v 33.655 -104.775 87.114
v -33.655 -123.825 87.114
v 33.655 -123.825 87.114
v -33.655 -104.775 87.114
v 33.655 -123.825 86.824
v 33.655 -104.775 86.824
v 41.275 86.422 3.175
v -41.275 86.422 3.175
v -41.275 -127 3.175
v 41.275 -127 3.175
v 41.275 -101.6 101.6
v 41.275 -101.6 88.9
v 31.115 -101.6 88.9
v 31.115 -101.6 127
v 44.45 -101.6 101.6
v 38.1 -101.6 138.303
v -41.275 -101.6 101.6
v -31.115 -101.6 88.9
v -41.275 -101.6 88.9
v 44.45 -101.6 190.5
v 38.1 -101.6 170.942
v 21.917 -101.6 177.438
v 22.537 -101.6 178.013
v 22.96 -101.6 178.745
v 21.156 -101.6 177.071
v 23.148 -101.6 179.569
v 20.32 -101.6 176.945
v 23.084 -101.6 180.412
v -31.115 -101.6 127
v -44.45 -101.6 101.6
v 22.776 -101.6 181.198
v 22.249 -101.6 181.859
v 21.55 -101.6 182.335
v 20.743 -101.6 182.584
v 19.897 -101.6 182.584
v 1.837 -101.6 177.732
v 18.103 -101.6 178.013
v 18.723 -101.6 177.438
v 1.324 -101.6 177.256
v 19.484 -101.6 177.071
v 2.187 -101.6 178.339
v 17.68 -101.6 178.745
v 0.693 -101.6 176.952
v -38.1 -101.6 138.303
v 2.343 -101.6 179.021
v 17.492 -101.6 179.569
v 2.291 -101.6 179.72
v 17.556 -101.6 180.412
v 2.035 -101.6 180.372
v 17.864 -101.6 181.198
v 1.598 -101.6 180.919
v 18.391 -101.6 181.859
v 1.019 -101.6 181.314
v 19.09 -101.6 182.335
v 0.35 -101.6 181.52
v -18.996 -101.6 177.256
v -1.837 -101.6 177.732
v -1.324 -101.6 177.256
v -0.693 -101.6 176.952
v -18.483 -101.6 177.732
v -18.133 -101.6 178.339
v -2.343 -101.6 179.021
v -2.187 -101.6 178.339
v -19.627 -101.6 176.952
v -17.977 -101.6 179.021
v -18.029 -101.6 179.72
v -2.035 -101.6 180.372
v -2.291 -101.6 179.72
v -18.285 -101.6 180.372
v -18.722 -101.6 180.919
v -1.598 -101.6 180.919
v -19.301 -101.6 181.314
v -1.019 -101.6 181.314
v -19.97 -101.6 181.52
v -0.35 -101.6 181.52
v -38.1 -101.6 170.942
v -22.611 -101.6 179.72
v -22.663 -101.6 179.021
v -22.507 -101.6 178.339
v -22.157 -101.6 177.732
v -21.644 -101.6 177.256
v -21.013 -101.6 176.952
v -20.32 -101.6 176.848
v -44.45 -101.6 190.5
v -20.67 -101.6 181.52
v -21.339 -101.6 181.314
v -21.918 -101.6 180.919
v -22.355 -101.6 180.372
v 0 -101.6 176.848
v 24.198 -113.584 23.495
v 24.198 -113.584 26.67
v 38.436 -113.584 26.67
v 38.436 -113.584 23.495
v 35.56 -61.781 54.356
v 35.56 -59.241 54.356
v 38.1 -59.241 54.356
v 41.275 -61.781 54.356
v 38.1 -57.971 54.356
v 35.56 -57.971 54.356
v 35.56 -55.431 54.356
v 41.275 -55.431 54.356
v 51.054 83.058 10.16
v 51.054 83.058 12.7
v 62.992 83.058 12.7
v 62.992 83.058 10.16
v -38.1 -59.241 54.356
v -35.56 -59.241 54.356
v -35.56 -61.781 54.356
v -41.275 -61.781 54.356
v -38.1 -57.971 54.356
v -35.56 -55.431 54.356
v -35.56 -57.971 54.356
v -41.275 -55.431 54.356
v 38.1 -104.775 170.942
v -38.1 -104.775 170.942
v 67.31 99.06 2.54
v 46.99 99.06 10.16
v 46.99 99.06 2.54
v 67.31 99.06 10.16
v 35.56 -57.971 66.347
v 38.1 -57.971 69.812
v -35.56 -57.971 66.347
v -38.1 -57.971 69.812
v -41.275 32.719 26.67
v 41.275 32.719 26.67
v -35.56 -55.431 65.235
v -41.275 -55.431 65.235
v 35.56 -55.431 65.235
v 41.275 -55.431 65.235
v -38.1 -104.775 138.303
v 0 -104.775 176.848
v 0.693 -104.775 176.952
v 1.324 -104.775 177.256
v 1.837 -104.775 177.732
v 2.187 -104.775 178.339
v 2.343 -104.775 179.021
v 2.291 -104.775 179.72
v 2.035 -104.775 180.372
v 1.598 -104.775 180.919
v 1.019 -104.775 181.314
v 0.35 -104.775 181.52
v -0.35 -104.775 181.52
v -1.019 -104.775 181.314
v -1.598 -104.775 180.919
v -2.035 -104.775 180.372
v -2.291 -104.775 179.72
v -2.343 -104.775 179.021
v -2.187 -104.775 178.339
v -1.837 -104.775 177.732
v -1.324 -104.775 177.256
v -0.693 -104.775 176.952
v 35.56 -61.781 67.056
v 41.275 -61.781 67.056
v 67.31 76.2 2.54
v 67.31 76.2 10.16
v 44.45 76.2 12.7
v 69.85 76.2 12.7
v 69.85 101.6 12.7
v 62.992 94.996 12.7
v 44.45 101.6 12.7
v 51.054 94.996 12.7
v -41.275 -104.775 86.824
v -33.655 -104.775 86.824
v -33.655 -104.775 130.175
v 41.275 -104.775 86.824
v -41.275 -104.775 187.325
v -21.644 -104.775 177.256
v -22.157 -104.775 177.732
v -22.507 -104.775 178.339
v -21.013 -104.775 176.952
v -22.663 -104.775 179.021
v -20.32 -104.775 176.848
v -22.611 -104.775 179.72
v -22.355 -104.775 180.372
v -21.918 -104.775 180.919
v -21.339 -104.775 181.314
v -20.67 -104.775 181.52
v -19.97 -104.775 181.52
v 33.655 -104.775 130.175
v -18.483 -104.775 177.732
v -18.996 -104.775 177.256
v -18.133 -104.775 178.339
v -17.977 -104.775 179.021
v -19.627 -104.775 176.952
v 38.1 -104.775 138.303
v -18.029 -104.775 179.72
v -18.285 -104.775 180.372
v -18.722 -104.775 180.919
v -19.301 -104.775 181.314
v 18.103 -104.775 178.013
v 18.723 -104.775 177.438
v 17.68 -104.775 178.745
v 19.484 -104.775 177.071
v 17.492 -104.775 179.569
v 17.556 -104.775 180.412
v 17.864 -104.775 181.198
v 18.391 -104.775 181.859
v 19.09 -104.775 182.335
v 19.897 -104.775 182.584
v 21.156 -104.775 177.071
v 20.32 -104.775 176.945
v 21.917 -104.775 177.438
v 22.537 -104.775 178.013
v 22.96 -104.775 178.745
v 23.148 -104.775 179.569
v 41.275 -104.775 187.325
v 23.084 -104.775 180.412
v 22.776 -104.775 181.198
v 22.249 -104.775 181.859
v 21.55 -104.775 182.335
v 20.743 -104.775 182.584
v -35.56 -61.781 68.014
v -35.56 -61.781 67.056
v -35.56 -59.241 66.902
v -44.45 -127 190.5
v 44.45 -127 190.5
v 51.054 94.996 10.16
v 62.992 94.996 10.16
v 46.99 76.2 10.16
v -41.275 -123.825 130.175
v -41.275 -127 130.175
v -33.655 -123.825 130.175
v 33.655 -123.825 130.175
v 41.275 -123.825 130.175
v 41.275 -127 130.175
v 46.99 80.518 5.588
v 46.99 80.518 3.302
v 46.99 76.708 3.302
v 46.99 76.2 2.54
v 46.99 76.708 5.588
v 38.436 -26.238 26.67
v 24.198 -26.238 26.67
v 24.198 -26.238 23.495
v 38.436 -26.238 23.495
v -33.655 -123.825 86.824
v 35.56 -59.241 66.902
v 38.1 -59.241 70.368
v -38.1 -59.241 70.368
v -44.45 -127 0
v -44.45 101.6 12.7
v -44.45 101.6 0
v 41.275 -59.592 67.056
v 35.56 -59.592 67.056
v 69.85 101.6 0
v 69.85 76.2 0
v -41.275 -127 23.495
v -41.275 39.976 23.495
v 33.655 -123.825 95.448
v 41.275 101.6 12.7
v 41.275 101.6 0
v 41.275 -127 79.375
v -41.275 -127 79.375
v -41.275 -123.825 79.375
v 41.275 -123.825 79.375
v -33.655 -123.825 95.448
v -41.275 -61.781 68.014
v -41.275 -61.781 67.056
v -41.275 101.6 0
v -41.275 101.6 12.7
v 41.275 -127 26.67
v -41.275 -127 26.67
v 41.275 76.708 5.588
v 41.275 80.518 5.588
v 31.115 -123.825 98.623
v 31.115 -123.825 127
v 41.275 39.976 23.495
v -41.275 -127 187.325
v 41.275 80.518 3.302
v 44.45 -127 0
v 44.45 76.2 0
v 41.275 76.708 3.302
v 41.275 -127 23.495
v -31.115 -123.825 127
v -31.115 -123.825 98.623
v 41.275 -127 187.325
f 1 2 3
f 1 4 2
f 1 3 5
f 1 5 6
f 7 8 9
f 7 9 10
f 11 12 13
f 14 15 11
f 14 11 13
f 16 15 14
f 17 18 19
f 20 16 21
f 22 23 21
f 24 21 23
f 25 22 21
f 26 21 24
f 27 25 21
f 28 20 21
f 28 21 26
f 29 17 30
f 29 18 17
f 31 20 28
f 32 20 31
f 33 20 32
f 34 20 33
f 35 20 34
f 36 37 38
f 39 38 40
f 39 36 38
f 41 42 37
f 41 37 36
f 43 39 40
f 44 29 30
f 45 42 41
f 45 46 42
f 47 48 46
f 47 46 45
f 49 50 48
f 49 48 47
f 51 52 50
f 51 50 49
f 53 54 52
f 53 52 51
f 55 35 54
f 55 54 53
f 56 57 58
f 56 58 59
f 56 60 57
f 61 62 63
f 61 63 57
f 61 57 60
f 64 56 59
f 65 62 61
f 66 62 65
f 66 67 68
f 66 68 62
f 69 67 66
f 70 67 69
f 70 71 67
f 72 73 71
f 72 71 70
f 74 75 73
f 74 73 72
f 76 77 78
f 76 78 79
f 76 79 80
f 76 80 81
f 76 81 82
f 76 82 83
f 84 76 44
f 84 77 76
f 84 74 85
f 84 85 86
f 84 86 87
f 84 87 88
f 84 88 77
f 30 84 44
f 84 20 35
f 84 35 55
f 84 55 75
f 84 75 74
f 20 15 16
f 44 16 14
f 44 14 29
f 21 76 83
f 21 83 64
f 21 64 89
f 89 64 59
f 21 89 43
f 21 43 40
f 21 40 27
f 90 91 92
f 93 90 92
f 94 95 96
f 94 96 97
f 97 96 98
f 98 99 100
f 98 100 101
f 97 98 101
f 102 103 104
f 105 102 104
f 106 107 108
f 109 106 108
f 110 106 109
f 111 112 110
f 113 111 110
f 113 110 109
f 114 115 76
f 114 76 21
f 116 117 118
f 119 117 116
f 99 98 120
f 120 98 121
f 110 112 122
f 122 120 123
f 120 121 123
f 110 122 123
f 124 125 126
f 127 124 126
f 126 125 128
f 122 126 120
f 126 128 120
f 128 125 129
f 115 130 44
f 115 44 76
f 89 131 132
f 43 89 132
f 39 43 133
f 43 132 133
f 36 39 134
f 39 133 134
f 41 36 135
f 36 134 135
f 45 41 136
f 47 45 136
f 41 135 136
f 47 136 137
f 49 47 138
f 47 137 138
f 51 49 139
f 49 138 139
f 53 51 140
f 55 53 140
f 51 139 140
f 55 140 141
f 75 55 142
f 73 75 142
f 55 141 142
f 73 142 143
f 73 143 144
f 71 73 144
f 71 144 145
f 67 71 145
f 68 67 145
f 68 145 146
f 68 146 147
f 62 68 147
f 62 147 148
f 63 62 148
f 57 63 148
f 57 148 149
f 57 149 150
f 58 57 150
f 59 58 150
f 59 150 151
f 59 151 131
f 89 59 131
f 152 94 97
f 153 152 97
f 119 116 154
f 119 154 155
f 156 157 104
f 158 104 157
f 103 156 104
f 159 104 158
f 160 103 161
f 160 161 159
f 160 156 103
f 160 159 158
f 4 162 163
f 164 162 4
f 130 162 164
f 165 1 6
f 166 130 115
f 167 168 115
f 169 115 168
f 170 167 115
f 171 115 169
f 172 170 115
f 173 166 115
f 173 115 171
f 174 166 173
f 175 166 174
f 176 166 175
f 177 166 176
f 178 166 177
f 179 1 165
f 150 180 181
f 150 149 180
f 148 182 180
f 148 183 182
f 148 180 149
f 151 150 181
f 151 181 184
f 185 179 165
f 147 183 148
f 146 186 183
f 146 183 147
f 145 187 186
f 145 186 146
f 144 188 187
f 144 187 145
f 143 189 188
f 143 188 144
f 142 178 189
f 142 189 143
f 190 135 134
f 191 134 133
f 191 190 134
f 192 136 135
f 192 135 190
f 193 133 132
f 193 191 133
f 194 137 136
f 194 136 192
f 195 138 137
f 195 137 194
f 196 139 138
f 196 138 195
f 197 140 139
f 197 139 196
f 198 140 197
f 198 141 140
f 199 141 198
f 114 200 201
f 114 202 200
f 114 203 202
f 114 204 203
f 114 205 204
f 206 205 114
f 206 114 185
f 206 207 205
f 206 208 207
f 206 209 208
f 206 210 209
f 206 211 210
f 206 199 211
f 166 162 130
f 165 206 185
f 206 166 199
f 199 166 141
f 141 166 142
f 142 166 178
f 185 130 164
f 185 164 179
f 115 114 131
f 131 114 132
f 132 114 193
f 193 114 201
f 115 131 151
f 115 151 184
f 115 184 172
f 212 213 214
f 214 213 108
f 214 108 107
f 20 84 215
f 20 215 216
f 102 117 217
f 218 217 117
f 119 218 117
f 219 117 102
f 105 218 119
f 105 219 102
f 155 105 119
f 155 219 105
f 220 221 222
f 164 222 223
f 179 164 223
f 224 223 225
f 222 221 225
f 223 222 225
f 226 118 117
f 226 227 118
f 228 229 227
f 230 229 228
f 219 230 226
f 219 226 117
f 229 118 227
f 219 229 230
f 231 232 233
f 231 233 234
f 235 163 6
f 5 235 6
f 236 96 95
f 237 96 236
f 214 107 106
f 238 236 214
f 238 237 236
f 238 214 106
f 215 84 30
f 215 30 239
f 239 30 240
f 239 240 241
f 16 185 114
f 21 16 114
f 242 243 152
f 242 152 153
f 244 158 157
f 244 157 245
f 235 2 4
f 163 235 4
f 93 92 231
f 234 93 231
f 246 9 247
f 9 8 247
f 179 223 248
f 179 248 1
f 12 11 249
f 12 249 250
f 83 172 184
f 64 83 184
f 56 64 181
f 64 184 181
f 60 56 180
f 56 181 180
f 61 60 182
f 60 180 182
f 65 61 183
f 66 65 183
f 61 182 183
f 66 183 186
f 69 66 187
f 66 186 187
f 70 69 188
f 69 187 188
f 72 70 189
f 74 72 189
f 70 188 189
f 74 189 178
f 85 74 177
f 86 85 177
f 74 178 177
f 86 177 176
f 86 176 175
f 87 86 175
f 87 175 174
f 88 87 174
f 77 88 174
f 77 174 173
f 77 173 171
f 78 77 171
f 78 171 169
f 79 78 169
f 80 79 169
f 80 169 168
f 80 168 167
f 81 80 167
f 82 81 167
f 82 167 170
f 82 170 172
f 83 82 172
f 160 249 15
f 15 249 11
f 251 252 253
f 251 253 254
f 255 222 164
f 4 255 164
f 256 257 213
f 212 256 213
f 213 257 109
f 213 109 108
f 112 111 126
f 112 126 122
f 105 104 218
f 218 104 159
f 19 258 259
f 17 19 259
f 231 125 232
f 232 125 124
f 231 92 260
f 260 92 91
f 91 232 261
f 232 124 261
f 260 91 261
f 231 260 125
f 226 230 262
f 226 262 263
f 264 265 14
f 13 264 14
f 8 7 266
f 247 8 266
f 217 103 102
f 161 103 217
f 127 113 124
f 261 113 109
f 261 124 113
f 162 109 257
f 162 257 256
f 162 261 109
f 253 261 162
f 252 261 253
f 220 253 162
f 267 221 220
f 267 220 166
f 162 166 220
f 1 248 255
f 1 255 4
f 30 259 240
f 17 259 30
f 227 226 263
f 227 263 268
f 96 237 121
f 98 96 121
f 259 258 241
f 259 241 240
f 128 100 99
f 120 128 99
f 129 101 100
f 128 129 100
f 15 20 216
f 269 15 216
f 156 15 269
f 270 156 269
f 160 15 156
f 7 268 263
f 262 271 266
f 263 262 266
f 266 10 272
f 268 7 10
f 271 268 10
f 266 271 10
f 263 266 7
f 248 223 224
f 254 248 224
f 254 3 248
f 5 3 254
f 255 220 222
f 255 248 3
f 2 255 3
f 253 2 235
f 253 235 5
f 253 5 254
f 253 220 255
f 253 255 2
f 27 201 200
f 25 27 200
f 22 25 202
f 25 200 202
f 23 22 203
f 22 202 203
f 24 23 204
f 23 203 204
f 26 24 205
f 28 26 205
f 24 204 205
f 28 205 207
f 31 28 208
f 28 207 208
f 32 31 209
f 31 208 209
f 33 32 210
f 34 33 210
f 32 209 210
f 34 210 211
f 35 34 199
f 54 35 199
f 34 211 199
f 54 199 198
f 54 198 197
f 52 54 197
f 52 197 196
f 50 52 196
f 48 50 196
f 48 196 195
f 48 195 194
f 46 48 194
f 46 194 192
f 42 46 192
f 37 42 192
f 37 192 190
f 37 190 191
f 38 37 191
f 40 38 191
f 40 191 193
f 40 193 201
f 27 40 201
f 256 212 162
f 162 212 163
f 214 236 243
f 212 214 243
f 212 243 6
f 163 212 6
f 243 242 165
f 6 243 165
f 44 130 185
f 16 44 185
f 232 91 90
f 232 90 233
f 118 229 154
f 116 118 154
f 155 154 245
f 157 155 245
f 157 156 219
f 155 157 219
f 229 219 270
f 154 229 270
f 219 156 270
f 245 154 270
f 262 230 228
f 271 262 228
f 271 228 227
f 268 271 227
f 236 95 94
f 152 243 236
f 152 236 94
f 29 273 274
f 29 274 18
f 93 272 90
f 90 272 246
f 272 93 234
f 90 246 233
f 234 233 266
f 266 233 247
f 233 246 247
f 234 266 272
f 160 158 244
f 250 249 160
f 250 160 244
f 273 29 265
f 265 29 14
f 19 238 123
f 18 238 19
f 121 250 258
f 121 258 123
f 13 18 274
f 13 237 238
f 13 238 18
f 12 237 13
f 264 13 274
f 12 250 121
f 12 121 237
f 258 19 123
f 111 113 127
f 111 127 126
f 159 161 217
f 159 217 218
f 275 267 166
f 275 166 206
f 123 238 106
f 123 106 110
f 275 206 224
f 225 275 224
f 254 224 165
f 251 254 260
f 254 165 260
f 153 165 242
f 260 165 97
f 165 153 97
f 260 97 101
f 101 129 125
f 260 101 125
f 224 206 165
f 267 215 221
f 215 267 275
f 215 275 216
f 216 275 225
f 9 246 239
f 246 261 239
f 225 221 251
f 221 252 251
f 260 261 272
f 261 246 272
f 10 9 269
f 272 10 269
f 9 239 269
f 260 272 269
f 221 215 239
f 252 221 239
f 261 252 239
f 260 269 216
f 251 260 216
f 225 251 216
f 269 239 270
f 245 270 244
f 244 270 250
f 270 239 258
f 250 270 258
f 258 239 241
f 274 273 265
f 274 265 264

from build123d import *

# Parameters (mm, degrees)
SKETCH3_W                       = 88.9
SKETCH3_H                       = 203.2
BOSS_EXTRUDE2_DEPTH             = 88.9
CUT_EXTRUDE1_DEPTH              = 101.6
SHELL2_T                        = -3.175
SKETCH5_W                       = 88.9
SKETCH5_H                       = 25.4
BOSS_EXTRUDE3_DEPTH             = 190.5
SHELL4_START                    = -41.275
SHELL4_DEPTH                    = 82.55
CUT_EXTRUDE2_REACH              = 284.057
SKETCH7_W                       = 82.55
SKETCH7_H                       = 38.1
BOSS_EXTRUDE4_REACH             = 246.475
BOSS_EXTRUDE5_REACH             = 284.057
SKETCH10_W                      = 88.9
SKETCH10_H                      = 3.175
CUT_EXTRUDE7_REACH              = 302.872
SKETCH13_W                      = 82.55
SKETCH13_H                      = 57.15
BOSS_EXTRUDE6_START             = -3.175
BOSS_EXTRUDE6_DEPTH             = 3.175
BOSS_EXTRUDE7_REACH             = 284.057
SKETCH16_W                      = 82.55
SKETCH16_H                      = 3.175
CUT_EXTRUDE8_REACH              = 302.872
SKETCH17_W                      = 82.55
SKETCH17_H                      = 76.2
BOSS_EXTRUDE8_REACH             = 286.353
SKETCH18_W                      = 82.548541704
SKETCH18_H                      = 0.29056195
BOSS_EXTRUDE9_REACH             = 246.475
CUT_EXTRUDE9_REACH              = 173.426
SKETCH23_W                      = 76.2
SKETCH23_H                      = 1.27
BOSS_EXTRUDE10_DEPTH            = 12.7
BOSS_EXTRUDE11_REACH            = 184.601
SKETCH25_W                      = 5.715
SKETCH25_H                      = 2.188780981
SKETCH26_W                      = 12.7
SKETCH26_H                      = 25.4
BOSS_EXTRUDE12_DEPTH            = 25.4
SKETCH27_W                      = 20.32
SKETCH27_H                      = 7.62
CUT_EXTRUDE10_DEPTH             = 22.86
SKETCH29_W                      = 2.286
SKETCH29_H                      = 3.81
CUT_EXTRUDE12_DEPTH             = 19.304
CUT_EXTRUDE13_REACH             = 231.392
SKETCH30_W                      = 11.938
SKETCH30_H                      = 11.938
CUT_EXTRUDE14_REACH             = 220.743
SKETCH31_W                      = 14.238530822
SKETCH31_H                      = 87.346215886
CUT_EXTRUDE16_REACH             = 194.71
SKETCH32_W                      = 7.62
SKETCH32_H                      = 19.05
CUT_EXTRUDE16_DIRECTION_2_DEPTH = 56.896
BOSS_EXTRUDE13_REACH            = 194.71
CUT_EXTRUDE17_REACH             = 291.413
SKETCH34_W                      = 76.2
SKETCH34_H                      = 32.639
CUT_EXTRUDE18_REACH             = 291.413
SKETCH35_R                      = 2.3495
SKETCH35_R_2                    = 2.83553705


# Read off the part's stored shape, not the designer's step: Shell4
with BuildPart() as part:
    # Sketch3 → Boss-Extrude2 (new body)
    with BuildSketch(Plane.XY):
        Rectangle(SKETCH3_W, SKETCH3_H)
    extrude(amount=BOSS_EXTRUDE2_DEPTH)

    # Sketch4 → Cut-Extrude1 (cut)
    with BuildSketch(Plane(origin=(44.45, 0, 0), x_dir=(0, 0, -1), z_dir=(1, 0, 0))):
        Polygon((0, 101.6), (-88.9, -101.6), (-88.9, 101.6), align=None)
    extrude(amount=-CUT_EXTRUDE1_DEPTH, mode=Mode.SUBTRACT)

    # Shell2
    shell2_openings = [part.faces().sort_by_distance(p)[0] for p in [
        (0, 0, 0),
        (0, -101.6, 44.45),
    ]]
    offset(amount=SHELL2_T, openings=shell2_openings, kind=Kind.INTERSECTION)

    # Sketch5 → Boss-Extrude3 (add)
    with BuildSketch(Plane.XY):
        with Locations((0, -114.3)):
            Rectangle(SKETCH5_W, SKETCH5_H)
    extrude(amount=BOSS_EXTRUDE3_DEPTH)

    # Shell4 outline → Shell4 (cut)
    with BuildSketch(Plane.YZ.offset(SHELL4_START)):
        Polygon((-123.825, 3.175), (-101.6, 3.175), (-101.6, 85.43443805), (-104.775, 86.82350055), (-104.775, 187.325), (-123.825, 187.325), align=None)
    extrude(amount=SHELL4_DEPTH, mode=Mode.SUBTRACT)

    # Sketch7 → Cut-Extrude2 (cut, up to next)
    with BuildSketch(Plane(origin=(0, -101.6, 0), x_dir=(1, 0, 0), z_dir=(0, 1, 0)), mode=Mode.PRIVATE) as cut_extrude2_sk1:
        with Locations((0, -107.95)):
            Rectangle(SKETCH7_W, SKETCH7_H)
    cut_extrude2_tool1 = extrude(cut_extrude2_sk1.sketch, amount=-CUT_EXTRUDE2_REACH, mode=Mode.PRIVATE) & part.part
    add(cut_extrude2_tool1.solids().sort_by_distance((0, -101.6, 107.95))[0], mode=Mode.SUBTRACT)

    # Sketch9 → Boss-Extrude4 (add, up to next)
    with BuildSketch(Plane.ZY.offset(-41.275), mode=Mode.PRIVATE) as boss_extrude4_sk1:
        Polygon((88.9, -101.6), (98.6234375, -123.825), (95.4484375, -123.825), (85.725, -101.6), align=None)
    boss_extrude4_tool1 = extrude(boss_extrude4_sk1.sketch, amount=BOSS_EXTRUDE4_REACH, mode=Mode.PRIVATE) - part.part
    add(boss_extrude4_tool1.solids().sort_by_distance((41.275, -112.7125, 92.174219))[0])

    # Sketch10 → Boss-Extrude5 (add, up to next)
    with BuildSketch(Plane(origin=(0, -101.6, 0), x_dir=(1, 0, 0), z_dir=(0, 1, 0)), mode=Mode.PRIVATE) as boss_extrude5_sk1:
        with Locations((0, -128.5875)):
            Rectangle(SKETCH10_W, SKETCH10_H)
    boss_extrude5_tool1 = extrude(boss_extrude5_sk1.sketch, amount=-BOSS_EXTRUDE5_REACH, mode=Mode.PRIVATE) - part.part
    add(boss_extrude5_tool1.solids().sort_by_distance((0, -101.6, 128.5875))[0])

    # Sketch13 → Cut-Extrude7 (cut, up to next)
    with BuildSketch(Plane.XZ.offset(127), mode=Mode.PRIVATE) as cut_extrude7_sk1:
        with Locations((0, 158.75)):
            Rectangle(SKETCH13_W, SKETCH13_H)
    cut_extrude7_tool1 = extrude(cut_extrude7_sk1.sketch, amount=-CUT_EXTRUDE7_REACH, mode=Mode.PRIVATE) & part.part
    add(cut_extrude7_tool1.solids().sort_by_distance((0, -127, 158.75))[0], mode=Mode.SUBTRACT)

    # Sketch14 → Boss-Extrude6 (add)
    with BuildSketch(Plane(origin=(44.45, 0, 0), x_dir=(0, 0, -1), z_dir=(1, 0, 0)).offset(BOSS_EXTRUDE6_START)):
        Polygon((0, 101.6), (-12.7, 101.6), (-101.6, -101.6), (-88.9, -101.6), align=None)
    boss_extrude6 = extrude(amount=BOSS_EXTRUDE6_DEPTH)

    # Mirror1: Boss-Extrude6 across plane
    add(boss_extrude6.mirror(Plane(origin=(0, 0, 0), x_dir=(0, 0, 1), z_dir=(1, 0, 0))))

    # Sketch16 → Boss-Extrude7 (add, up to next)
    with BuildSketch(Plane(origin=(0, -101.6, 0), x_dir=(1, 0, 0), z_dir=(0, 1, 0)), mode=Mode.PRIVATE) as boss_extrude7_sk1:
        with Locations((0, -1.5875)):
            Rectangle(SKETCH16_W, SKETCH16_H)
    boss_extrude7_tool1 = extrude(boss_extrude7_sk1.sketch, amount=BOSS_EXTRUDE7_REACH, mode=Mode.PRIVATE) - part.part
    add(boss_extrude7_tool1.solids().sort_by_distance((0, -101.6, 1.5875))[0])

    # Sketch17 → Cut-Extrude8 (cut, up to next)
    with BuildSketch(Plane.XZ.offset(127), mode=Mode.PRIVATE) as cut_extrude8_sk1:
        with Locations((0, 41.275)):
            Rectangle(SKETCH17_W, SKETCH17_H)
    cut_extrude8_tool1 = extrude(cut_extrude8_sk1.sketch, amount=-CUT_EXTRUDE8_REACH, mode=Mode.PRIVATE) & part.part
    add(cut_extrude8_tool1.solids().sort_by_distance((0, -127, 41.275))[0], mode=Mode.SUBTRACT)

    # Sketch18 → Boss-Extrude8 (add, up to next)
    with BuildSketch(Plane.XZ.offset(104.775), mode=Mode.PRIVATE) as boss_extrude8_sk1:
        with Locations((-0.000729148, 86.968781525)):
            Rectangle(SKETCH18_W, SKETCH18_H)
    boss_extrude8_tool1 = extrude(boss_extrude8_sk1.sketch, amount=BOSS_EXTRUDE8_REACH, mode=Mode.PRIVATE) - part.part
    add(boss_extrude8_tool1.solids().sort_by_distance((-0.000729, -104.775, 86.968782))[0])

    # Sketch19 → Boss-Extrude9 (add, up to next)
    with BuildSketch(Plane(origin=(-41.275, 0, 0), x_dir=(0, 0, -1), z_dir=(1, 0, 0)), mode=Mode.PRIVATE) as boss_extrude9_sk1:
        Polygon((-26.67, -127), (-23.495, -127), (-23.495, 39.9758584), (-26.67, 32.718715543), align=None)
    boss_extrude9_tool1 = extrude(boss_extrude9_sk1.sketch, amount=BOSS_EXTRUDE9_REACH, mode=Mode.PRIVATE) - part.part
    add(boss_extrude9_tool1.solids().sort_by_distance((-41.275, -45.312922, 25.070745))[0])

    # Cut-Extrude9: up to this plane
    cut_extrude9_end = Plane(origin=(-57.15, 100.327400202, -2.908799538), z_dir=(0, -0.40081883401970775, -0.9161573349021892))
    # Sketch23 → Cut-Extrude9 (cut, up to the surface)
    with BuildSketch(Plane(origin=(0, 0, 84.28350055), x_dir=(-1, 0, 0), z_dir=(0, 0, -1)), mode=Mode.PRIVATE) as cut_extrude9_sk1:
        with Locations((0, -58.605922581)):
            Rectangle(SKETCH23_W, SKETCH23_H)
    cut_extrude9_tool1 = split(extrude(cut_extrude9_sk1.sketch, amount=CUT_EXTRUDE9_REACH, mode=Mode.PRIVATE), bisect_by=cut_extrude9_end, keep=Keep.BOTH, mode=Mode.PRIVATE)
    add(cut_extrude9_tool1.solids().sort_by_distance((0, -58.605923, 84.283501))[0], mode=Mode.SUBTRACT)

    # Sketch24 → Boss-Extrude10 (add)
    with BuildSketch(Plane.XY.offset(67.056)):
        Polygon((-35.56, -59.240922581), (-35.56, -61.780922581), (-41.275, -61.780922581), (-41.275, -55.430922581), (-35.56, -55.430922581), (-35.56, -57.970922581), (-38.1, -57.970922581), (-38.1, -59.240922581), align=None)
    boss_extrude10 = extrude(amount=-BOSS_EXTRUDE10_DEPTH)

    # Sketch25 → Boss-Extrude11 (add, up to next)
    with BuildSketch(Plane.XY.offset(67.056), mode=Mode.PRIVATE) as boss_extrude11_sk1:
        with Locations((-38.4175, -60.686532091)):
            Rectangle(SKETCH25_W, SKETCH25_H)
    boss_extrude11_tool1 = extrude(boss_extrude11_sk1.sketch, amount=BOSS_EXTRUDE11_REACH, mode=Mode.PRIVATE) - part.part
    add(boss_extrude11_tool1.solids().sort_by_distance((-38.4175, -60.686532, 67.056))[0])

    # Mirror2: Boss-Extrude10 across plane
    add(boss_extrude10.mirror(Plane(origin=(0, 0, 0), x_dir=(0, 0, 1), z_dir=(1, 0, 0))))

    # Sketch26 → Boss-Extrude12 (add)
    with BuildSketch(Plane(origin=(44.45, 0, 0), x_dir=(0, 0, -1), z_dir=(1, 0, 0))):
        with Locations((-6.35, 88.9)):
            Rectangle(SKETCH26_W, SKETCH26_H)
    extrude(amount=BOSS_EXTRUDE12_DEPTH)

    # Sketch27 → Cut-Extrude10 (cut)
    with BuildSketch(Plane.XZ.offset(-76.2)):
        with Locations((57.15, 6.35)):
            Rectangle(SKETCH27_W, SKETCH27_H)
    extrude(amount=-CUT_EXTRUDE10_DEPTH, mode=Mode.SUBTRACT)

    # Sketch29 → Cut-Extrude12 (cut)
    with BuildSketch(Plane(origin=(46.99, 0, 0), x_dir=(0, 0, -1), z_dir=(1, 0, 0))):
        with Locations((-4.445, 78.613)):
            Rectangle(SKETCH29_W, SKETCH29_H)
    extrude(amount=-CUT_EXTRUDE12_DEPTH, mode=Mode.SUBTRACT)

    # Sketch30 → Cut-Extrude13 (cut, up to next)
    with BuildSketch(Plane.XY.offset(12.7), mode=Mode.PRIVATE) as cut_extrude13_sk1:
        with Locations((57.023, 89.027)):
            Rectangle(SKETCH30_W, SKETCH30_H)
    cut_extrude13_tool1 = extrude(cut_extrude13_sk1.sketch, amount=-CUT_EXTRUDE13_REACH, mode=Mode.PRIVATE) & part.part
    add(cut_extrude13_tool1.solids().sort_by_distance((57.023, 89.027, 12.7))[0], mode=Mode.SUBTRACT)

    # Sketch31 → Cut-Extrude14 (cut, up to next)
    with BuildSketch(Plane.XY.offset(26.67), mode=Mode.PRIVATE) as cut_extrude14_sk1:
        with Locations((31.316857017, -69.910616217)):
            Rectangle(SKETCH31_W, SKETCH31_H)
    cut_extrude14_tool1 = extrude(cut_extrude14_sk1.sketch, amount=-CUT_EXTRUDE14_REACH, mode=Mode.PRIVATE) & part.part
    add(cut_extrude14_tool1.solids().sort_by_distance((31.316857, -69.910616, 26.67))[0], mode=Mode.SUBTRACT)

    # Sketch32 → Cut-Extrude16 (cut, up to next)
    with BuildSketch(Plane(origin=(0, 0, 127), x_dir=(-1, 0, 0), z_dir=(0, 0, -1)), mode=Mode.PRIVATE) as cut_extrude16_sk1:
        with Locations((-37.465, -114.3)):
            Rectangle(SKETCH32_W, SKETCH32_H)
    cut_extrude16_tool1 = extrude(cut_extrude16_sk1.sketch, amount=-CUT_EXTRUDE16_REACH, mode=Mode.PRIVATE) & part.part
    cut_extrude16 = cut_extrude16_tool1.solids().sort_by_distance((37.465, -114.3, 127))[0]
    add(cut_extrude16, mode=Mode.SUBTRACT)

    # Sketch32 → Cut-Extrude16 direction 2 (cut)
    with BuildSketch(Plane(origin=(0, 0, 127), x_dir=(-1, 0, 0), z_dir=(0, 0, -1))):
        with Locations((-37.465, -114.3)):
            Rectangle(SKETCH32_W, SKETCH32_H)
    cut_extrude16_direction_2 = extrude(amount=CUT_EXTRUDE16_DIRECTION_2_DEPTH, mode=Mode.SUBTRACT)

    # Mirror5: Cut-Extrude16, Cut-Extrude16 direction 2 across plane
    add(cut_extrude16.mirror(Plane(origin=(0, 0, 0), x_dir=(0, 0, 1), z_dir=(1, 0, 0))), mode=Mode.SUBTRACT)
    add(cut_extrude16_direction_2.mirror(Plane(origin=(0, 0, 0), x_dir=(0, 0, 1), z_dir=(1, 0, 0))), mode=Mode.SUBTRACT)

    # Boss-Extrude13: up to this plane
    boss_extrude13_end = Plane(origin=(-57.15, 101.6, 0), z_dir=(0, -0.40081883401970775, -0.9161573349021892))
    # Sketch33 → Boss-Extrude13 (add, up to the surface)
    with BuildSketch(Plane(origin=(0, 0, 127), x_dir=(-1, 0, 0), z_dir=(0, 0, -1)), mode=Mode.PRIVATE) as boss_extrude13_sk1:
        Polygon((-31.115, -101.6), (-41.275, -101.6), (-41.275, -104.775), (-33.655, -104.775), (-33.655, -123.825), (-31.115, -123.825), align=None)
    boss_extrude13_tool1 = split(extrude(boss_extrude13_sk1.sketch, amount=BOSS_EXTRUDE13_REACH, mode=Mode.PRIVATE), bisect_by=boss_extrude13_end, keep=Keep.BOTH, mode=Mode.PRIVATE)
    boss_extrude13 = boss_extrude13_tool1.solids().sort_by_distance((36.195, -101.844372, 127))[0]
    add(boss_extrude13)

    # Mirror6: Boss-Extrude13 across plane
    add(boss_extrude13.mirror(Plane(origin=(0, 0, 0), x_dir=(0, 0, 1), z_dir=(1, 0, 0))))

    # Sketch34 → Cut-Extrude17 (cut, up to next)
    with BuildSketch(Plane.XZ.offset(104.775), mode=Mode.PRIVATE) as cut_extrude17_sk1:
        with Locations((0, 154.6225)):
            Rectangle(SKETCH34_W, SKETCH34_H)
    cut_extrude17_tool1 = extrude(cut_extrude17_sk1.sketch, amount=-CUT_EXTRUDE17_REACH, mode=Mode.PRIVATE) & part.part
    add(cut_extrude17_tool1.solids().sort_by_distance((0, -104.775, 154.6225))[0], mode=Mode.SUBTRACT)

    # Sketch35 → Cut-Extrude18 (cut, up to next)
    with BuildSketch(Plane.XZ.offset(104.775), mode=Mode.PRIVATE) as cut_extrude18_sk1:
        with Locations(Location((0, 179.197, 0), (0, 0, 270))):
            Circle(SKETCH35_R)
    cut_extrude18_tool1 = extrude(cut_extrude18_sk1.sketch, amount=-CUT_EXTRUDE18_REACH, mode=Mode.PRIVATE) & part.part
    # Sketch35 → Cut-Extrude18 (cut, up to next)
    with BuildSketch(Plane.XZ.offset(104.775), mode=Mode.PRIVATE) as cut_extrude18_sk2:
        with Locations(Location((20.32, 179.780535398, 0), (0, 0, 270))):
            Circle(SKETCH35_R_2)
    cut_extrude18_tool2 = extrude(cut_extrude18_sk2.sketch, amount=-CUT_EXTRUDE18_REACH, mode=Mode.PRIVATE) & part.part
    # Sketch35 → Cut-Extrude18 (cut, up to next)
    with BuildSketch(Plane.XZ.offset(104.775), mode=Mode.PRIVATE) as cut_extrude18_sk3:
        with Locations(Location((-20.32, 179.197, 0), (0, 0, 270))):
            Circle(SKETCH35_R)
    cut_extrude18_tool3 = extrude(cut_extrude18_sk3.sketch, amount=-CUT_EXTRUDE18_REACH, mode=Mode.PRIVATE) & part.part
    add(cut_extrude18_tool1.solids().sort_by_distance((0, -104.775, 179.197))[0], mode=Mode.SUBTRACT)
    add(cut_extrude18_tool2.solids().sort_by_distance((20.32, -104.775, 179.780535))[0], mode=Mode.SUBTRACT)
    add(cut_extrude18_tool3.solids().sort_by_distance((-20.32, -104.775, 179.197))[0], mode=Mode.SUBTRACT)


solid = part.part
